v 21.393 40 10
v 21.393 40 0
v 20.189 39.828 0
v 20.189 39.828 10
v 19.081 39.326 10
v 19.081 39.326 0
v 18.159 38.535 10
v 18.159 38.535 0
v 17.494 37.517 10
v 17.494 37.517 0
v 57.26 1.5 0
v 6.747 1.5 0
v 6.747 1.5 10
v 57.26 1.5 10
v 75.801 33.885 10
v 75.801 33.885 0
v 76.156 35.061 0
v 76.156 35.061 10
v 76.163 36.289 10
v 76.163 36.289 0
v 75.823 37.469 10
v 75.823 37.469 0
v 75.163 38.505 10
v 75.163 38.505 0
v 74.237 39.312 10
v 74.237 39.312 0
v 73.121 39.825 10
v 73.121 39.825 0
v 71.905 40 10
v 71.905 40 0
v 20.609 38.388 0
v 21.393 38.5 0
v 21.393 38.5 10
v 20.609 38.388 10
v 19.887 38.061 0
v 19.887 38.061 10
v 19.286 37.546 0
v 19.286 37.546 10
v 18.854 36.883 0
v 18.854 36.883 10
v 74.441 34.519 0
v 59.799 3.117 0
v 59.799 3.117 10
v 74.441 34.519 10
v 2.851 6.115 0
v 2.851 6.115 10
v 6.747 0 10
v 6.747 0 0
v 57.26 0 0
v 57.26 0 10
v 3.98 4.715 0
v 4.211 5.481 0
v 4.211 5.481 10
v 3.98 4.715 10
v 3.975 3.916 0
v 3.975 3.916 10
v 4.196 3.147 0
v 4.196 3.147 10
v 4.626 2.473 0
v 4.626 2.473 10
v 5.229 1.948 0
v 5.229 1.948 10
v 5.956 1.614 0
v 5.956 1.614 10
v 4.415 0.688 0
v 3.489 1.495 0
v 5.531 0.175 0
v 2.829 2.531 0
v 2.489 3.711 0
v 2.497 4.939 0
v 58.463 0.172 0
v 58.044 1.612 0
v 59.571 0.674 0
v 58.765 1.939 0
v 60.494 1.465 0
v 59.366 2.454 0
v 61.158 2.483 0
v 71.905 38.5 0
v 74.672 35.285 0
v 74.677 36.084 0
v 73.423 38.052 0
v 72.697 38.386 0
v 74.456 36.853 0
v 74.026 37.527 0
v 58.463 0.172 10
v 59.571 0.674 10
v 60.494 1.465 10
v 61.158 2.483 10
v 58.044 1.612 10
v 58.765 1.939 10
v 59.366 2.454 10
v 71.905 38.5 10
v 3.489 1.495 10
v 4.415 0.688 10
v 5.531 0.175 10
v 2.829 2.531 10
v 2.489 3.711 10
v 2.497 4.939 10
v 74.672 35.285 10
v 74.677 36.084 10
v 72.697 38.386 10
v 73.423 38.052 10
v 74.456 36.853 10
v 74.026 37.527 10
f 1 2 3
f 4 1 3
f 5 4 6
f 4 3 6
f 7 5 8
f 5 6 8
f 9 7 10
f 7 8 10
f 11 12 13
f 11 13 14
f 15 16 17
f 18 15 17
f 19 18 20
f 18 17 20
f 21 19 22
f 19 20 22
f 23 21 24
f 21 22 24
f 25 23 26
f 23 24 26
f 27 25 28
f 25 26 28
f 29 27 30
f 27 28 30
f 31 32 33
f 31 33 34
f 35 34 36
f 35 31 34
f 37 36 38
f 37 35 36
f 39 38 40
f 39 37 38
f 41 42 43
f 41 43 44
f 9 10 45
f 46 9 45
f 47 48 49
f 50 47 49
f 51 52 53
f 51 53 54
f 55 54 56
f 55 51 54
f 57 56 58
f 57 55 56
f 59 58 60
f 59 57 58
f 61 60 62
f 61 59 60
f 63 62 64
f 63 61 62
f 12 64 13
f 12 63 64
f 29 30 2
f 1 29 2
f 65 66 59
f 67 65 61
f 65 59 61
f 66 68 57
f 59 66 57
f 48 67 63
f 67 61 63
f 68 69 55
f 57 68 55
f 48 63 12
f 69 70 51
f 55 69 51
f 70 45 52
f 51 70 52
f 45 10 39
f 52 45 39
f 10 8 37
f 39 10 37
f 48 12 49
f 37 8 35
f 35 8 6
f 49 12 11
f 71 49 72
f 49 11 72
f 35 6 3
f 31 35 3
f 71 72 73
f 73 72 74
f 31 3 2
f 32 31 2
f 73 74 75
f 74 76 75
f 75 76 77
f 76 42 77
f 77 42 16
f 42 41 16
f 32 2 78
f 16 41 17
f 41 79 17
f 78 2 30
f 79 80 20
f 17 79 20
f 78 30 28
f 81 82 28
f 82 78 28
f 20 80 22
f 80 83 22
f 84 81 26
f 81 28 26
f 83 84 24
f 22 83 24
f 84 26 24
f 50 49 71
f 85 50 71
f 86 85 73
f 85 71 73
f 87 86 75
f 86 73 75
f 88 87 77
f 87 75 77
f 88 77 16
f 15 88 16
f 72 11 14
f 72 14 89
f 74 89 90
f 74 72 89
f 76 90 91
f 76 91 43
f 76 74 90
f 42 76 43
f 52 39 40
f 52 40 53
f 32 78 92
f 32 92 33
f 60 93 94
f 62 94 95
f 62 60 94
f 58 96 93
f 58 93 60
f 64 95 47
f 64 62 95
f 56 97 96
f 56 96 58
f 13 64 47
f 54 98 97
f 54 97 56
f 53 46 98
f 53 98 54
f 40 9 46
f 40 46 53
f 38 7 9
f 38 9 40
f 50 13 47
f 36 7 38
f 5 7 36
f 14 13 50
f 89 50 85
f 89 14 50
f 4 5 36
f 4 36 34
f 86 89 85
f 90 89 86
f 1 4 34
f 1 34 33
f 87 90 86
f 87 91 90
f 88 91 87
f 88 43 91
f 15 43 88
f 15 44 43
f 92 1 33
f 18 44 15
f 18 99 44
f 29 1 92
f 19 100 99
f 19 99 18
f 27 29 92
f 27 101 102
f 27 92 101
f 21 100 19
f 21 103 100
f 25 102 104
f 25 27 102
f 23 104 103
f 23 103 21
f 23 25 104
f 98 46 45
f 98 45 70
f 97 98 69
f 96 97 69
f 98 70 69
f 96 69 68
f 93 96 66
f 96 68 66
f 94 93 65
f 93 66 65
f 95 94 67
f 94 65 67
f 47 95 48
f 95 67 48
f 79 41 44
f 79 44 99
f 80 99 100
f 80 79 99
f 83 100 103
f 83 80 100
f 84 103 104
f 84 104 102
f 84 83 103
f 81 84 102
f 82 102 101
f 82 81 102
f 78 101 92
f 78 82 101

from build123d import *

# Parameters (mm, degrees)
BOSS_EXTRUDE1_DEPTH = 10


with BuildPart() as part:
    # Sketch1 → Boss-Extrude1 (new body)
    with BuildSketch(Plane.XY):
        with BuildLine():
            Line((6.747131567, 0), (57.259771997, 0))
            ThreePointArc((57.259771997, 0), (59.570856854, 0.673619806), (61.158070395, 2.483489977))
            Line((61.158070395, 2.483489977), (75.800845312, 33.885022121))
            ThreePointArc((75.800845312, 33.885022121), (75.530405908, 38.011130086), (71.90517476, 40))
            Line((71.90517476, 40), (21.392534329, 40))
            ThreePointArc((21.392534329, 40), (19.081449472, 39.326380194), (17.494235931, 37.516510023))
            Line((17.494235931, 37.516510023), (2.851461014, 6.114977879))
            ThreePointArc((2.851461014, 6.114977879), (3.121900418, 1.988869914), (6.747131567, 0))
        make_face()
        with BuildLine():
            ThreePointArc((4.210922695, 5.481050486), (4.386987587, 2.794819326), (6.747131567, 1.5))
            Line((6.747131567, 1.5), (57.259771997, 1.5))
            ThreePointArc((57.259771997, 1.5), (58.764907442, 1.938706975), (59.798608715, 3.11741737))
            Line((59.798608715, 3.11741737), (74.441383631, 34.518949514))
            ThreePointArc((74.441383631, 34.518949514), (74.265318739, 37.205180674), (71.90517476, 38.5))
            Line((71.90517476, 38.5), (21.392534329, 38.5))
            ThreePointArc((21.392534329, 38.5), (19.887398884, 38.061293025), (18.853697612, 36.88258263))
            Line((18.853697612, 36.88258263), (4.210922695, 5.481050486))
        make_face(mode=Mode.SUBTRACT)
    extrude(amount=BOSS_EXTRUDE1_DEPTH)


solid = part.part
